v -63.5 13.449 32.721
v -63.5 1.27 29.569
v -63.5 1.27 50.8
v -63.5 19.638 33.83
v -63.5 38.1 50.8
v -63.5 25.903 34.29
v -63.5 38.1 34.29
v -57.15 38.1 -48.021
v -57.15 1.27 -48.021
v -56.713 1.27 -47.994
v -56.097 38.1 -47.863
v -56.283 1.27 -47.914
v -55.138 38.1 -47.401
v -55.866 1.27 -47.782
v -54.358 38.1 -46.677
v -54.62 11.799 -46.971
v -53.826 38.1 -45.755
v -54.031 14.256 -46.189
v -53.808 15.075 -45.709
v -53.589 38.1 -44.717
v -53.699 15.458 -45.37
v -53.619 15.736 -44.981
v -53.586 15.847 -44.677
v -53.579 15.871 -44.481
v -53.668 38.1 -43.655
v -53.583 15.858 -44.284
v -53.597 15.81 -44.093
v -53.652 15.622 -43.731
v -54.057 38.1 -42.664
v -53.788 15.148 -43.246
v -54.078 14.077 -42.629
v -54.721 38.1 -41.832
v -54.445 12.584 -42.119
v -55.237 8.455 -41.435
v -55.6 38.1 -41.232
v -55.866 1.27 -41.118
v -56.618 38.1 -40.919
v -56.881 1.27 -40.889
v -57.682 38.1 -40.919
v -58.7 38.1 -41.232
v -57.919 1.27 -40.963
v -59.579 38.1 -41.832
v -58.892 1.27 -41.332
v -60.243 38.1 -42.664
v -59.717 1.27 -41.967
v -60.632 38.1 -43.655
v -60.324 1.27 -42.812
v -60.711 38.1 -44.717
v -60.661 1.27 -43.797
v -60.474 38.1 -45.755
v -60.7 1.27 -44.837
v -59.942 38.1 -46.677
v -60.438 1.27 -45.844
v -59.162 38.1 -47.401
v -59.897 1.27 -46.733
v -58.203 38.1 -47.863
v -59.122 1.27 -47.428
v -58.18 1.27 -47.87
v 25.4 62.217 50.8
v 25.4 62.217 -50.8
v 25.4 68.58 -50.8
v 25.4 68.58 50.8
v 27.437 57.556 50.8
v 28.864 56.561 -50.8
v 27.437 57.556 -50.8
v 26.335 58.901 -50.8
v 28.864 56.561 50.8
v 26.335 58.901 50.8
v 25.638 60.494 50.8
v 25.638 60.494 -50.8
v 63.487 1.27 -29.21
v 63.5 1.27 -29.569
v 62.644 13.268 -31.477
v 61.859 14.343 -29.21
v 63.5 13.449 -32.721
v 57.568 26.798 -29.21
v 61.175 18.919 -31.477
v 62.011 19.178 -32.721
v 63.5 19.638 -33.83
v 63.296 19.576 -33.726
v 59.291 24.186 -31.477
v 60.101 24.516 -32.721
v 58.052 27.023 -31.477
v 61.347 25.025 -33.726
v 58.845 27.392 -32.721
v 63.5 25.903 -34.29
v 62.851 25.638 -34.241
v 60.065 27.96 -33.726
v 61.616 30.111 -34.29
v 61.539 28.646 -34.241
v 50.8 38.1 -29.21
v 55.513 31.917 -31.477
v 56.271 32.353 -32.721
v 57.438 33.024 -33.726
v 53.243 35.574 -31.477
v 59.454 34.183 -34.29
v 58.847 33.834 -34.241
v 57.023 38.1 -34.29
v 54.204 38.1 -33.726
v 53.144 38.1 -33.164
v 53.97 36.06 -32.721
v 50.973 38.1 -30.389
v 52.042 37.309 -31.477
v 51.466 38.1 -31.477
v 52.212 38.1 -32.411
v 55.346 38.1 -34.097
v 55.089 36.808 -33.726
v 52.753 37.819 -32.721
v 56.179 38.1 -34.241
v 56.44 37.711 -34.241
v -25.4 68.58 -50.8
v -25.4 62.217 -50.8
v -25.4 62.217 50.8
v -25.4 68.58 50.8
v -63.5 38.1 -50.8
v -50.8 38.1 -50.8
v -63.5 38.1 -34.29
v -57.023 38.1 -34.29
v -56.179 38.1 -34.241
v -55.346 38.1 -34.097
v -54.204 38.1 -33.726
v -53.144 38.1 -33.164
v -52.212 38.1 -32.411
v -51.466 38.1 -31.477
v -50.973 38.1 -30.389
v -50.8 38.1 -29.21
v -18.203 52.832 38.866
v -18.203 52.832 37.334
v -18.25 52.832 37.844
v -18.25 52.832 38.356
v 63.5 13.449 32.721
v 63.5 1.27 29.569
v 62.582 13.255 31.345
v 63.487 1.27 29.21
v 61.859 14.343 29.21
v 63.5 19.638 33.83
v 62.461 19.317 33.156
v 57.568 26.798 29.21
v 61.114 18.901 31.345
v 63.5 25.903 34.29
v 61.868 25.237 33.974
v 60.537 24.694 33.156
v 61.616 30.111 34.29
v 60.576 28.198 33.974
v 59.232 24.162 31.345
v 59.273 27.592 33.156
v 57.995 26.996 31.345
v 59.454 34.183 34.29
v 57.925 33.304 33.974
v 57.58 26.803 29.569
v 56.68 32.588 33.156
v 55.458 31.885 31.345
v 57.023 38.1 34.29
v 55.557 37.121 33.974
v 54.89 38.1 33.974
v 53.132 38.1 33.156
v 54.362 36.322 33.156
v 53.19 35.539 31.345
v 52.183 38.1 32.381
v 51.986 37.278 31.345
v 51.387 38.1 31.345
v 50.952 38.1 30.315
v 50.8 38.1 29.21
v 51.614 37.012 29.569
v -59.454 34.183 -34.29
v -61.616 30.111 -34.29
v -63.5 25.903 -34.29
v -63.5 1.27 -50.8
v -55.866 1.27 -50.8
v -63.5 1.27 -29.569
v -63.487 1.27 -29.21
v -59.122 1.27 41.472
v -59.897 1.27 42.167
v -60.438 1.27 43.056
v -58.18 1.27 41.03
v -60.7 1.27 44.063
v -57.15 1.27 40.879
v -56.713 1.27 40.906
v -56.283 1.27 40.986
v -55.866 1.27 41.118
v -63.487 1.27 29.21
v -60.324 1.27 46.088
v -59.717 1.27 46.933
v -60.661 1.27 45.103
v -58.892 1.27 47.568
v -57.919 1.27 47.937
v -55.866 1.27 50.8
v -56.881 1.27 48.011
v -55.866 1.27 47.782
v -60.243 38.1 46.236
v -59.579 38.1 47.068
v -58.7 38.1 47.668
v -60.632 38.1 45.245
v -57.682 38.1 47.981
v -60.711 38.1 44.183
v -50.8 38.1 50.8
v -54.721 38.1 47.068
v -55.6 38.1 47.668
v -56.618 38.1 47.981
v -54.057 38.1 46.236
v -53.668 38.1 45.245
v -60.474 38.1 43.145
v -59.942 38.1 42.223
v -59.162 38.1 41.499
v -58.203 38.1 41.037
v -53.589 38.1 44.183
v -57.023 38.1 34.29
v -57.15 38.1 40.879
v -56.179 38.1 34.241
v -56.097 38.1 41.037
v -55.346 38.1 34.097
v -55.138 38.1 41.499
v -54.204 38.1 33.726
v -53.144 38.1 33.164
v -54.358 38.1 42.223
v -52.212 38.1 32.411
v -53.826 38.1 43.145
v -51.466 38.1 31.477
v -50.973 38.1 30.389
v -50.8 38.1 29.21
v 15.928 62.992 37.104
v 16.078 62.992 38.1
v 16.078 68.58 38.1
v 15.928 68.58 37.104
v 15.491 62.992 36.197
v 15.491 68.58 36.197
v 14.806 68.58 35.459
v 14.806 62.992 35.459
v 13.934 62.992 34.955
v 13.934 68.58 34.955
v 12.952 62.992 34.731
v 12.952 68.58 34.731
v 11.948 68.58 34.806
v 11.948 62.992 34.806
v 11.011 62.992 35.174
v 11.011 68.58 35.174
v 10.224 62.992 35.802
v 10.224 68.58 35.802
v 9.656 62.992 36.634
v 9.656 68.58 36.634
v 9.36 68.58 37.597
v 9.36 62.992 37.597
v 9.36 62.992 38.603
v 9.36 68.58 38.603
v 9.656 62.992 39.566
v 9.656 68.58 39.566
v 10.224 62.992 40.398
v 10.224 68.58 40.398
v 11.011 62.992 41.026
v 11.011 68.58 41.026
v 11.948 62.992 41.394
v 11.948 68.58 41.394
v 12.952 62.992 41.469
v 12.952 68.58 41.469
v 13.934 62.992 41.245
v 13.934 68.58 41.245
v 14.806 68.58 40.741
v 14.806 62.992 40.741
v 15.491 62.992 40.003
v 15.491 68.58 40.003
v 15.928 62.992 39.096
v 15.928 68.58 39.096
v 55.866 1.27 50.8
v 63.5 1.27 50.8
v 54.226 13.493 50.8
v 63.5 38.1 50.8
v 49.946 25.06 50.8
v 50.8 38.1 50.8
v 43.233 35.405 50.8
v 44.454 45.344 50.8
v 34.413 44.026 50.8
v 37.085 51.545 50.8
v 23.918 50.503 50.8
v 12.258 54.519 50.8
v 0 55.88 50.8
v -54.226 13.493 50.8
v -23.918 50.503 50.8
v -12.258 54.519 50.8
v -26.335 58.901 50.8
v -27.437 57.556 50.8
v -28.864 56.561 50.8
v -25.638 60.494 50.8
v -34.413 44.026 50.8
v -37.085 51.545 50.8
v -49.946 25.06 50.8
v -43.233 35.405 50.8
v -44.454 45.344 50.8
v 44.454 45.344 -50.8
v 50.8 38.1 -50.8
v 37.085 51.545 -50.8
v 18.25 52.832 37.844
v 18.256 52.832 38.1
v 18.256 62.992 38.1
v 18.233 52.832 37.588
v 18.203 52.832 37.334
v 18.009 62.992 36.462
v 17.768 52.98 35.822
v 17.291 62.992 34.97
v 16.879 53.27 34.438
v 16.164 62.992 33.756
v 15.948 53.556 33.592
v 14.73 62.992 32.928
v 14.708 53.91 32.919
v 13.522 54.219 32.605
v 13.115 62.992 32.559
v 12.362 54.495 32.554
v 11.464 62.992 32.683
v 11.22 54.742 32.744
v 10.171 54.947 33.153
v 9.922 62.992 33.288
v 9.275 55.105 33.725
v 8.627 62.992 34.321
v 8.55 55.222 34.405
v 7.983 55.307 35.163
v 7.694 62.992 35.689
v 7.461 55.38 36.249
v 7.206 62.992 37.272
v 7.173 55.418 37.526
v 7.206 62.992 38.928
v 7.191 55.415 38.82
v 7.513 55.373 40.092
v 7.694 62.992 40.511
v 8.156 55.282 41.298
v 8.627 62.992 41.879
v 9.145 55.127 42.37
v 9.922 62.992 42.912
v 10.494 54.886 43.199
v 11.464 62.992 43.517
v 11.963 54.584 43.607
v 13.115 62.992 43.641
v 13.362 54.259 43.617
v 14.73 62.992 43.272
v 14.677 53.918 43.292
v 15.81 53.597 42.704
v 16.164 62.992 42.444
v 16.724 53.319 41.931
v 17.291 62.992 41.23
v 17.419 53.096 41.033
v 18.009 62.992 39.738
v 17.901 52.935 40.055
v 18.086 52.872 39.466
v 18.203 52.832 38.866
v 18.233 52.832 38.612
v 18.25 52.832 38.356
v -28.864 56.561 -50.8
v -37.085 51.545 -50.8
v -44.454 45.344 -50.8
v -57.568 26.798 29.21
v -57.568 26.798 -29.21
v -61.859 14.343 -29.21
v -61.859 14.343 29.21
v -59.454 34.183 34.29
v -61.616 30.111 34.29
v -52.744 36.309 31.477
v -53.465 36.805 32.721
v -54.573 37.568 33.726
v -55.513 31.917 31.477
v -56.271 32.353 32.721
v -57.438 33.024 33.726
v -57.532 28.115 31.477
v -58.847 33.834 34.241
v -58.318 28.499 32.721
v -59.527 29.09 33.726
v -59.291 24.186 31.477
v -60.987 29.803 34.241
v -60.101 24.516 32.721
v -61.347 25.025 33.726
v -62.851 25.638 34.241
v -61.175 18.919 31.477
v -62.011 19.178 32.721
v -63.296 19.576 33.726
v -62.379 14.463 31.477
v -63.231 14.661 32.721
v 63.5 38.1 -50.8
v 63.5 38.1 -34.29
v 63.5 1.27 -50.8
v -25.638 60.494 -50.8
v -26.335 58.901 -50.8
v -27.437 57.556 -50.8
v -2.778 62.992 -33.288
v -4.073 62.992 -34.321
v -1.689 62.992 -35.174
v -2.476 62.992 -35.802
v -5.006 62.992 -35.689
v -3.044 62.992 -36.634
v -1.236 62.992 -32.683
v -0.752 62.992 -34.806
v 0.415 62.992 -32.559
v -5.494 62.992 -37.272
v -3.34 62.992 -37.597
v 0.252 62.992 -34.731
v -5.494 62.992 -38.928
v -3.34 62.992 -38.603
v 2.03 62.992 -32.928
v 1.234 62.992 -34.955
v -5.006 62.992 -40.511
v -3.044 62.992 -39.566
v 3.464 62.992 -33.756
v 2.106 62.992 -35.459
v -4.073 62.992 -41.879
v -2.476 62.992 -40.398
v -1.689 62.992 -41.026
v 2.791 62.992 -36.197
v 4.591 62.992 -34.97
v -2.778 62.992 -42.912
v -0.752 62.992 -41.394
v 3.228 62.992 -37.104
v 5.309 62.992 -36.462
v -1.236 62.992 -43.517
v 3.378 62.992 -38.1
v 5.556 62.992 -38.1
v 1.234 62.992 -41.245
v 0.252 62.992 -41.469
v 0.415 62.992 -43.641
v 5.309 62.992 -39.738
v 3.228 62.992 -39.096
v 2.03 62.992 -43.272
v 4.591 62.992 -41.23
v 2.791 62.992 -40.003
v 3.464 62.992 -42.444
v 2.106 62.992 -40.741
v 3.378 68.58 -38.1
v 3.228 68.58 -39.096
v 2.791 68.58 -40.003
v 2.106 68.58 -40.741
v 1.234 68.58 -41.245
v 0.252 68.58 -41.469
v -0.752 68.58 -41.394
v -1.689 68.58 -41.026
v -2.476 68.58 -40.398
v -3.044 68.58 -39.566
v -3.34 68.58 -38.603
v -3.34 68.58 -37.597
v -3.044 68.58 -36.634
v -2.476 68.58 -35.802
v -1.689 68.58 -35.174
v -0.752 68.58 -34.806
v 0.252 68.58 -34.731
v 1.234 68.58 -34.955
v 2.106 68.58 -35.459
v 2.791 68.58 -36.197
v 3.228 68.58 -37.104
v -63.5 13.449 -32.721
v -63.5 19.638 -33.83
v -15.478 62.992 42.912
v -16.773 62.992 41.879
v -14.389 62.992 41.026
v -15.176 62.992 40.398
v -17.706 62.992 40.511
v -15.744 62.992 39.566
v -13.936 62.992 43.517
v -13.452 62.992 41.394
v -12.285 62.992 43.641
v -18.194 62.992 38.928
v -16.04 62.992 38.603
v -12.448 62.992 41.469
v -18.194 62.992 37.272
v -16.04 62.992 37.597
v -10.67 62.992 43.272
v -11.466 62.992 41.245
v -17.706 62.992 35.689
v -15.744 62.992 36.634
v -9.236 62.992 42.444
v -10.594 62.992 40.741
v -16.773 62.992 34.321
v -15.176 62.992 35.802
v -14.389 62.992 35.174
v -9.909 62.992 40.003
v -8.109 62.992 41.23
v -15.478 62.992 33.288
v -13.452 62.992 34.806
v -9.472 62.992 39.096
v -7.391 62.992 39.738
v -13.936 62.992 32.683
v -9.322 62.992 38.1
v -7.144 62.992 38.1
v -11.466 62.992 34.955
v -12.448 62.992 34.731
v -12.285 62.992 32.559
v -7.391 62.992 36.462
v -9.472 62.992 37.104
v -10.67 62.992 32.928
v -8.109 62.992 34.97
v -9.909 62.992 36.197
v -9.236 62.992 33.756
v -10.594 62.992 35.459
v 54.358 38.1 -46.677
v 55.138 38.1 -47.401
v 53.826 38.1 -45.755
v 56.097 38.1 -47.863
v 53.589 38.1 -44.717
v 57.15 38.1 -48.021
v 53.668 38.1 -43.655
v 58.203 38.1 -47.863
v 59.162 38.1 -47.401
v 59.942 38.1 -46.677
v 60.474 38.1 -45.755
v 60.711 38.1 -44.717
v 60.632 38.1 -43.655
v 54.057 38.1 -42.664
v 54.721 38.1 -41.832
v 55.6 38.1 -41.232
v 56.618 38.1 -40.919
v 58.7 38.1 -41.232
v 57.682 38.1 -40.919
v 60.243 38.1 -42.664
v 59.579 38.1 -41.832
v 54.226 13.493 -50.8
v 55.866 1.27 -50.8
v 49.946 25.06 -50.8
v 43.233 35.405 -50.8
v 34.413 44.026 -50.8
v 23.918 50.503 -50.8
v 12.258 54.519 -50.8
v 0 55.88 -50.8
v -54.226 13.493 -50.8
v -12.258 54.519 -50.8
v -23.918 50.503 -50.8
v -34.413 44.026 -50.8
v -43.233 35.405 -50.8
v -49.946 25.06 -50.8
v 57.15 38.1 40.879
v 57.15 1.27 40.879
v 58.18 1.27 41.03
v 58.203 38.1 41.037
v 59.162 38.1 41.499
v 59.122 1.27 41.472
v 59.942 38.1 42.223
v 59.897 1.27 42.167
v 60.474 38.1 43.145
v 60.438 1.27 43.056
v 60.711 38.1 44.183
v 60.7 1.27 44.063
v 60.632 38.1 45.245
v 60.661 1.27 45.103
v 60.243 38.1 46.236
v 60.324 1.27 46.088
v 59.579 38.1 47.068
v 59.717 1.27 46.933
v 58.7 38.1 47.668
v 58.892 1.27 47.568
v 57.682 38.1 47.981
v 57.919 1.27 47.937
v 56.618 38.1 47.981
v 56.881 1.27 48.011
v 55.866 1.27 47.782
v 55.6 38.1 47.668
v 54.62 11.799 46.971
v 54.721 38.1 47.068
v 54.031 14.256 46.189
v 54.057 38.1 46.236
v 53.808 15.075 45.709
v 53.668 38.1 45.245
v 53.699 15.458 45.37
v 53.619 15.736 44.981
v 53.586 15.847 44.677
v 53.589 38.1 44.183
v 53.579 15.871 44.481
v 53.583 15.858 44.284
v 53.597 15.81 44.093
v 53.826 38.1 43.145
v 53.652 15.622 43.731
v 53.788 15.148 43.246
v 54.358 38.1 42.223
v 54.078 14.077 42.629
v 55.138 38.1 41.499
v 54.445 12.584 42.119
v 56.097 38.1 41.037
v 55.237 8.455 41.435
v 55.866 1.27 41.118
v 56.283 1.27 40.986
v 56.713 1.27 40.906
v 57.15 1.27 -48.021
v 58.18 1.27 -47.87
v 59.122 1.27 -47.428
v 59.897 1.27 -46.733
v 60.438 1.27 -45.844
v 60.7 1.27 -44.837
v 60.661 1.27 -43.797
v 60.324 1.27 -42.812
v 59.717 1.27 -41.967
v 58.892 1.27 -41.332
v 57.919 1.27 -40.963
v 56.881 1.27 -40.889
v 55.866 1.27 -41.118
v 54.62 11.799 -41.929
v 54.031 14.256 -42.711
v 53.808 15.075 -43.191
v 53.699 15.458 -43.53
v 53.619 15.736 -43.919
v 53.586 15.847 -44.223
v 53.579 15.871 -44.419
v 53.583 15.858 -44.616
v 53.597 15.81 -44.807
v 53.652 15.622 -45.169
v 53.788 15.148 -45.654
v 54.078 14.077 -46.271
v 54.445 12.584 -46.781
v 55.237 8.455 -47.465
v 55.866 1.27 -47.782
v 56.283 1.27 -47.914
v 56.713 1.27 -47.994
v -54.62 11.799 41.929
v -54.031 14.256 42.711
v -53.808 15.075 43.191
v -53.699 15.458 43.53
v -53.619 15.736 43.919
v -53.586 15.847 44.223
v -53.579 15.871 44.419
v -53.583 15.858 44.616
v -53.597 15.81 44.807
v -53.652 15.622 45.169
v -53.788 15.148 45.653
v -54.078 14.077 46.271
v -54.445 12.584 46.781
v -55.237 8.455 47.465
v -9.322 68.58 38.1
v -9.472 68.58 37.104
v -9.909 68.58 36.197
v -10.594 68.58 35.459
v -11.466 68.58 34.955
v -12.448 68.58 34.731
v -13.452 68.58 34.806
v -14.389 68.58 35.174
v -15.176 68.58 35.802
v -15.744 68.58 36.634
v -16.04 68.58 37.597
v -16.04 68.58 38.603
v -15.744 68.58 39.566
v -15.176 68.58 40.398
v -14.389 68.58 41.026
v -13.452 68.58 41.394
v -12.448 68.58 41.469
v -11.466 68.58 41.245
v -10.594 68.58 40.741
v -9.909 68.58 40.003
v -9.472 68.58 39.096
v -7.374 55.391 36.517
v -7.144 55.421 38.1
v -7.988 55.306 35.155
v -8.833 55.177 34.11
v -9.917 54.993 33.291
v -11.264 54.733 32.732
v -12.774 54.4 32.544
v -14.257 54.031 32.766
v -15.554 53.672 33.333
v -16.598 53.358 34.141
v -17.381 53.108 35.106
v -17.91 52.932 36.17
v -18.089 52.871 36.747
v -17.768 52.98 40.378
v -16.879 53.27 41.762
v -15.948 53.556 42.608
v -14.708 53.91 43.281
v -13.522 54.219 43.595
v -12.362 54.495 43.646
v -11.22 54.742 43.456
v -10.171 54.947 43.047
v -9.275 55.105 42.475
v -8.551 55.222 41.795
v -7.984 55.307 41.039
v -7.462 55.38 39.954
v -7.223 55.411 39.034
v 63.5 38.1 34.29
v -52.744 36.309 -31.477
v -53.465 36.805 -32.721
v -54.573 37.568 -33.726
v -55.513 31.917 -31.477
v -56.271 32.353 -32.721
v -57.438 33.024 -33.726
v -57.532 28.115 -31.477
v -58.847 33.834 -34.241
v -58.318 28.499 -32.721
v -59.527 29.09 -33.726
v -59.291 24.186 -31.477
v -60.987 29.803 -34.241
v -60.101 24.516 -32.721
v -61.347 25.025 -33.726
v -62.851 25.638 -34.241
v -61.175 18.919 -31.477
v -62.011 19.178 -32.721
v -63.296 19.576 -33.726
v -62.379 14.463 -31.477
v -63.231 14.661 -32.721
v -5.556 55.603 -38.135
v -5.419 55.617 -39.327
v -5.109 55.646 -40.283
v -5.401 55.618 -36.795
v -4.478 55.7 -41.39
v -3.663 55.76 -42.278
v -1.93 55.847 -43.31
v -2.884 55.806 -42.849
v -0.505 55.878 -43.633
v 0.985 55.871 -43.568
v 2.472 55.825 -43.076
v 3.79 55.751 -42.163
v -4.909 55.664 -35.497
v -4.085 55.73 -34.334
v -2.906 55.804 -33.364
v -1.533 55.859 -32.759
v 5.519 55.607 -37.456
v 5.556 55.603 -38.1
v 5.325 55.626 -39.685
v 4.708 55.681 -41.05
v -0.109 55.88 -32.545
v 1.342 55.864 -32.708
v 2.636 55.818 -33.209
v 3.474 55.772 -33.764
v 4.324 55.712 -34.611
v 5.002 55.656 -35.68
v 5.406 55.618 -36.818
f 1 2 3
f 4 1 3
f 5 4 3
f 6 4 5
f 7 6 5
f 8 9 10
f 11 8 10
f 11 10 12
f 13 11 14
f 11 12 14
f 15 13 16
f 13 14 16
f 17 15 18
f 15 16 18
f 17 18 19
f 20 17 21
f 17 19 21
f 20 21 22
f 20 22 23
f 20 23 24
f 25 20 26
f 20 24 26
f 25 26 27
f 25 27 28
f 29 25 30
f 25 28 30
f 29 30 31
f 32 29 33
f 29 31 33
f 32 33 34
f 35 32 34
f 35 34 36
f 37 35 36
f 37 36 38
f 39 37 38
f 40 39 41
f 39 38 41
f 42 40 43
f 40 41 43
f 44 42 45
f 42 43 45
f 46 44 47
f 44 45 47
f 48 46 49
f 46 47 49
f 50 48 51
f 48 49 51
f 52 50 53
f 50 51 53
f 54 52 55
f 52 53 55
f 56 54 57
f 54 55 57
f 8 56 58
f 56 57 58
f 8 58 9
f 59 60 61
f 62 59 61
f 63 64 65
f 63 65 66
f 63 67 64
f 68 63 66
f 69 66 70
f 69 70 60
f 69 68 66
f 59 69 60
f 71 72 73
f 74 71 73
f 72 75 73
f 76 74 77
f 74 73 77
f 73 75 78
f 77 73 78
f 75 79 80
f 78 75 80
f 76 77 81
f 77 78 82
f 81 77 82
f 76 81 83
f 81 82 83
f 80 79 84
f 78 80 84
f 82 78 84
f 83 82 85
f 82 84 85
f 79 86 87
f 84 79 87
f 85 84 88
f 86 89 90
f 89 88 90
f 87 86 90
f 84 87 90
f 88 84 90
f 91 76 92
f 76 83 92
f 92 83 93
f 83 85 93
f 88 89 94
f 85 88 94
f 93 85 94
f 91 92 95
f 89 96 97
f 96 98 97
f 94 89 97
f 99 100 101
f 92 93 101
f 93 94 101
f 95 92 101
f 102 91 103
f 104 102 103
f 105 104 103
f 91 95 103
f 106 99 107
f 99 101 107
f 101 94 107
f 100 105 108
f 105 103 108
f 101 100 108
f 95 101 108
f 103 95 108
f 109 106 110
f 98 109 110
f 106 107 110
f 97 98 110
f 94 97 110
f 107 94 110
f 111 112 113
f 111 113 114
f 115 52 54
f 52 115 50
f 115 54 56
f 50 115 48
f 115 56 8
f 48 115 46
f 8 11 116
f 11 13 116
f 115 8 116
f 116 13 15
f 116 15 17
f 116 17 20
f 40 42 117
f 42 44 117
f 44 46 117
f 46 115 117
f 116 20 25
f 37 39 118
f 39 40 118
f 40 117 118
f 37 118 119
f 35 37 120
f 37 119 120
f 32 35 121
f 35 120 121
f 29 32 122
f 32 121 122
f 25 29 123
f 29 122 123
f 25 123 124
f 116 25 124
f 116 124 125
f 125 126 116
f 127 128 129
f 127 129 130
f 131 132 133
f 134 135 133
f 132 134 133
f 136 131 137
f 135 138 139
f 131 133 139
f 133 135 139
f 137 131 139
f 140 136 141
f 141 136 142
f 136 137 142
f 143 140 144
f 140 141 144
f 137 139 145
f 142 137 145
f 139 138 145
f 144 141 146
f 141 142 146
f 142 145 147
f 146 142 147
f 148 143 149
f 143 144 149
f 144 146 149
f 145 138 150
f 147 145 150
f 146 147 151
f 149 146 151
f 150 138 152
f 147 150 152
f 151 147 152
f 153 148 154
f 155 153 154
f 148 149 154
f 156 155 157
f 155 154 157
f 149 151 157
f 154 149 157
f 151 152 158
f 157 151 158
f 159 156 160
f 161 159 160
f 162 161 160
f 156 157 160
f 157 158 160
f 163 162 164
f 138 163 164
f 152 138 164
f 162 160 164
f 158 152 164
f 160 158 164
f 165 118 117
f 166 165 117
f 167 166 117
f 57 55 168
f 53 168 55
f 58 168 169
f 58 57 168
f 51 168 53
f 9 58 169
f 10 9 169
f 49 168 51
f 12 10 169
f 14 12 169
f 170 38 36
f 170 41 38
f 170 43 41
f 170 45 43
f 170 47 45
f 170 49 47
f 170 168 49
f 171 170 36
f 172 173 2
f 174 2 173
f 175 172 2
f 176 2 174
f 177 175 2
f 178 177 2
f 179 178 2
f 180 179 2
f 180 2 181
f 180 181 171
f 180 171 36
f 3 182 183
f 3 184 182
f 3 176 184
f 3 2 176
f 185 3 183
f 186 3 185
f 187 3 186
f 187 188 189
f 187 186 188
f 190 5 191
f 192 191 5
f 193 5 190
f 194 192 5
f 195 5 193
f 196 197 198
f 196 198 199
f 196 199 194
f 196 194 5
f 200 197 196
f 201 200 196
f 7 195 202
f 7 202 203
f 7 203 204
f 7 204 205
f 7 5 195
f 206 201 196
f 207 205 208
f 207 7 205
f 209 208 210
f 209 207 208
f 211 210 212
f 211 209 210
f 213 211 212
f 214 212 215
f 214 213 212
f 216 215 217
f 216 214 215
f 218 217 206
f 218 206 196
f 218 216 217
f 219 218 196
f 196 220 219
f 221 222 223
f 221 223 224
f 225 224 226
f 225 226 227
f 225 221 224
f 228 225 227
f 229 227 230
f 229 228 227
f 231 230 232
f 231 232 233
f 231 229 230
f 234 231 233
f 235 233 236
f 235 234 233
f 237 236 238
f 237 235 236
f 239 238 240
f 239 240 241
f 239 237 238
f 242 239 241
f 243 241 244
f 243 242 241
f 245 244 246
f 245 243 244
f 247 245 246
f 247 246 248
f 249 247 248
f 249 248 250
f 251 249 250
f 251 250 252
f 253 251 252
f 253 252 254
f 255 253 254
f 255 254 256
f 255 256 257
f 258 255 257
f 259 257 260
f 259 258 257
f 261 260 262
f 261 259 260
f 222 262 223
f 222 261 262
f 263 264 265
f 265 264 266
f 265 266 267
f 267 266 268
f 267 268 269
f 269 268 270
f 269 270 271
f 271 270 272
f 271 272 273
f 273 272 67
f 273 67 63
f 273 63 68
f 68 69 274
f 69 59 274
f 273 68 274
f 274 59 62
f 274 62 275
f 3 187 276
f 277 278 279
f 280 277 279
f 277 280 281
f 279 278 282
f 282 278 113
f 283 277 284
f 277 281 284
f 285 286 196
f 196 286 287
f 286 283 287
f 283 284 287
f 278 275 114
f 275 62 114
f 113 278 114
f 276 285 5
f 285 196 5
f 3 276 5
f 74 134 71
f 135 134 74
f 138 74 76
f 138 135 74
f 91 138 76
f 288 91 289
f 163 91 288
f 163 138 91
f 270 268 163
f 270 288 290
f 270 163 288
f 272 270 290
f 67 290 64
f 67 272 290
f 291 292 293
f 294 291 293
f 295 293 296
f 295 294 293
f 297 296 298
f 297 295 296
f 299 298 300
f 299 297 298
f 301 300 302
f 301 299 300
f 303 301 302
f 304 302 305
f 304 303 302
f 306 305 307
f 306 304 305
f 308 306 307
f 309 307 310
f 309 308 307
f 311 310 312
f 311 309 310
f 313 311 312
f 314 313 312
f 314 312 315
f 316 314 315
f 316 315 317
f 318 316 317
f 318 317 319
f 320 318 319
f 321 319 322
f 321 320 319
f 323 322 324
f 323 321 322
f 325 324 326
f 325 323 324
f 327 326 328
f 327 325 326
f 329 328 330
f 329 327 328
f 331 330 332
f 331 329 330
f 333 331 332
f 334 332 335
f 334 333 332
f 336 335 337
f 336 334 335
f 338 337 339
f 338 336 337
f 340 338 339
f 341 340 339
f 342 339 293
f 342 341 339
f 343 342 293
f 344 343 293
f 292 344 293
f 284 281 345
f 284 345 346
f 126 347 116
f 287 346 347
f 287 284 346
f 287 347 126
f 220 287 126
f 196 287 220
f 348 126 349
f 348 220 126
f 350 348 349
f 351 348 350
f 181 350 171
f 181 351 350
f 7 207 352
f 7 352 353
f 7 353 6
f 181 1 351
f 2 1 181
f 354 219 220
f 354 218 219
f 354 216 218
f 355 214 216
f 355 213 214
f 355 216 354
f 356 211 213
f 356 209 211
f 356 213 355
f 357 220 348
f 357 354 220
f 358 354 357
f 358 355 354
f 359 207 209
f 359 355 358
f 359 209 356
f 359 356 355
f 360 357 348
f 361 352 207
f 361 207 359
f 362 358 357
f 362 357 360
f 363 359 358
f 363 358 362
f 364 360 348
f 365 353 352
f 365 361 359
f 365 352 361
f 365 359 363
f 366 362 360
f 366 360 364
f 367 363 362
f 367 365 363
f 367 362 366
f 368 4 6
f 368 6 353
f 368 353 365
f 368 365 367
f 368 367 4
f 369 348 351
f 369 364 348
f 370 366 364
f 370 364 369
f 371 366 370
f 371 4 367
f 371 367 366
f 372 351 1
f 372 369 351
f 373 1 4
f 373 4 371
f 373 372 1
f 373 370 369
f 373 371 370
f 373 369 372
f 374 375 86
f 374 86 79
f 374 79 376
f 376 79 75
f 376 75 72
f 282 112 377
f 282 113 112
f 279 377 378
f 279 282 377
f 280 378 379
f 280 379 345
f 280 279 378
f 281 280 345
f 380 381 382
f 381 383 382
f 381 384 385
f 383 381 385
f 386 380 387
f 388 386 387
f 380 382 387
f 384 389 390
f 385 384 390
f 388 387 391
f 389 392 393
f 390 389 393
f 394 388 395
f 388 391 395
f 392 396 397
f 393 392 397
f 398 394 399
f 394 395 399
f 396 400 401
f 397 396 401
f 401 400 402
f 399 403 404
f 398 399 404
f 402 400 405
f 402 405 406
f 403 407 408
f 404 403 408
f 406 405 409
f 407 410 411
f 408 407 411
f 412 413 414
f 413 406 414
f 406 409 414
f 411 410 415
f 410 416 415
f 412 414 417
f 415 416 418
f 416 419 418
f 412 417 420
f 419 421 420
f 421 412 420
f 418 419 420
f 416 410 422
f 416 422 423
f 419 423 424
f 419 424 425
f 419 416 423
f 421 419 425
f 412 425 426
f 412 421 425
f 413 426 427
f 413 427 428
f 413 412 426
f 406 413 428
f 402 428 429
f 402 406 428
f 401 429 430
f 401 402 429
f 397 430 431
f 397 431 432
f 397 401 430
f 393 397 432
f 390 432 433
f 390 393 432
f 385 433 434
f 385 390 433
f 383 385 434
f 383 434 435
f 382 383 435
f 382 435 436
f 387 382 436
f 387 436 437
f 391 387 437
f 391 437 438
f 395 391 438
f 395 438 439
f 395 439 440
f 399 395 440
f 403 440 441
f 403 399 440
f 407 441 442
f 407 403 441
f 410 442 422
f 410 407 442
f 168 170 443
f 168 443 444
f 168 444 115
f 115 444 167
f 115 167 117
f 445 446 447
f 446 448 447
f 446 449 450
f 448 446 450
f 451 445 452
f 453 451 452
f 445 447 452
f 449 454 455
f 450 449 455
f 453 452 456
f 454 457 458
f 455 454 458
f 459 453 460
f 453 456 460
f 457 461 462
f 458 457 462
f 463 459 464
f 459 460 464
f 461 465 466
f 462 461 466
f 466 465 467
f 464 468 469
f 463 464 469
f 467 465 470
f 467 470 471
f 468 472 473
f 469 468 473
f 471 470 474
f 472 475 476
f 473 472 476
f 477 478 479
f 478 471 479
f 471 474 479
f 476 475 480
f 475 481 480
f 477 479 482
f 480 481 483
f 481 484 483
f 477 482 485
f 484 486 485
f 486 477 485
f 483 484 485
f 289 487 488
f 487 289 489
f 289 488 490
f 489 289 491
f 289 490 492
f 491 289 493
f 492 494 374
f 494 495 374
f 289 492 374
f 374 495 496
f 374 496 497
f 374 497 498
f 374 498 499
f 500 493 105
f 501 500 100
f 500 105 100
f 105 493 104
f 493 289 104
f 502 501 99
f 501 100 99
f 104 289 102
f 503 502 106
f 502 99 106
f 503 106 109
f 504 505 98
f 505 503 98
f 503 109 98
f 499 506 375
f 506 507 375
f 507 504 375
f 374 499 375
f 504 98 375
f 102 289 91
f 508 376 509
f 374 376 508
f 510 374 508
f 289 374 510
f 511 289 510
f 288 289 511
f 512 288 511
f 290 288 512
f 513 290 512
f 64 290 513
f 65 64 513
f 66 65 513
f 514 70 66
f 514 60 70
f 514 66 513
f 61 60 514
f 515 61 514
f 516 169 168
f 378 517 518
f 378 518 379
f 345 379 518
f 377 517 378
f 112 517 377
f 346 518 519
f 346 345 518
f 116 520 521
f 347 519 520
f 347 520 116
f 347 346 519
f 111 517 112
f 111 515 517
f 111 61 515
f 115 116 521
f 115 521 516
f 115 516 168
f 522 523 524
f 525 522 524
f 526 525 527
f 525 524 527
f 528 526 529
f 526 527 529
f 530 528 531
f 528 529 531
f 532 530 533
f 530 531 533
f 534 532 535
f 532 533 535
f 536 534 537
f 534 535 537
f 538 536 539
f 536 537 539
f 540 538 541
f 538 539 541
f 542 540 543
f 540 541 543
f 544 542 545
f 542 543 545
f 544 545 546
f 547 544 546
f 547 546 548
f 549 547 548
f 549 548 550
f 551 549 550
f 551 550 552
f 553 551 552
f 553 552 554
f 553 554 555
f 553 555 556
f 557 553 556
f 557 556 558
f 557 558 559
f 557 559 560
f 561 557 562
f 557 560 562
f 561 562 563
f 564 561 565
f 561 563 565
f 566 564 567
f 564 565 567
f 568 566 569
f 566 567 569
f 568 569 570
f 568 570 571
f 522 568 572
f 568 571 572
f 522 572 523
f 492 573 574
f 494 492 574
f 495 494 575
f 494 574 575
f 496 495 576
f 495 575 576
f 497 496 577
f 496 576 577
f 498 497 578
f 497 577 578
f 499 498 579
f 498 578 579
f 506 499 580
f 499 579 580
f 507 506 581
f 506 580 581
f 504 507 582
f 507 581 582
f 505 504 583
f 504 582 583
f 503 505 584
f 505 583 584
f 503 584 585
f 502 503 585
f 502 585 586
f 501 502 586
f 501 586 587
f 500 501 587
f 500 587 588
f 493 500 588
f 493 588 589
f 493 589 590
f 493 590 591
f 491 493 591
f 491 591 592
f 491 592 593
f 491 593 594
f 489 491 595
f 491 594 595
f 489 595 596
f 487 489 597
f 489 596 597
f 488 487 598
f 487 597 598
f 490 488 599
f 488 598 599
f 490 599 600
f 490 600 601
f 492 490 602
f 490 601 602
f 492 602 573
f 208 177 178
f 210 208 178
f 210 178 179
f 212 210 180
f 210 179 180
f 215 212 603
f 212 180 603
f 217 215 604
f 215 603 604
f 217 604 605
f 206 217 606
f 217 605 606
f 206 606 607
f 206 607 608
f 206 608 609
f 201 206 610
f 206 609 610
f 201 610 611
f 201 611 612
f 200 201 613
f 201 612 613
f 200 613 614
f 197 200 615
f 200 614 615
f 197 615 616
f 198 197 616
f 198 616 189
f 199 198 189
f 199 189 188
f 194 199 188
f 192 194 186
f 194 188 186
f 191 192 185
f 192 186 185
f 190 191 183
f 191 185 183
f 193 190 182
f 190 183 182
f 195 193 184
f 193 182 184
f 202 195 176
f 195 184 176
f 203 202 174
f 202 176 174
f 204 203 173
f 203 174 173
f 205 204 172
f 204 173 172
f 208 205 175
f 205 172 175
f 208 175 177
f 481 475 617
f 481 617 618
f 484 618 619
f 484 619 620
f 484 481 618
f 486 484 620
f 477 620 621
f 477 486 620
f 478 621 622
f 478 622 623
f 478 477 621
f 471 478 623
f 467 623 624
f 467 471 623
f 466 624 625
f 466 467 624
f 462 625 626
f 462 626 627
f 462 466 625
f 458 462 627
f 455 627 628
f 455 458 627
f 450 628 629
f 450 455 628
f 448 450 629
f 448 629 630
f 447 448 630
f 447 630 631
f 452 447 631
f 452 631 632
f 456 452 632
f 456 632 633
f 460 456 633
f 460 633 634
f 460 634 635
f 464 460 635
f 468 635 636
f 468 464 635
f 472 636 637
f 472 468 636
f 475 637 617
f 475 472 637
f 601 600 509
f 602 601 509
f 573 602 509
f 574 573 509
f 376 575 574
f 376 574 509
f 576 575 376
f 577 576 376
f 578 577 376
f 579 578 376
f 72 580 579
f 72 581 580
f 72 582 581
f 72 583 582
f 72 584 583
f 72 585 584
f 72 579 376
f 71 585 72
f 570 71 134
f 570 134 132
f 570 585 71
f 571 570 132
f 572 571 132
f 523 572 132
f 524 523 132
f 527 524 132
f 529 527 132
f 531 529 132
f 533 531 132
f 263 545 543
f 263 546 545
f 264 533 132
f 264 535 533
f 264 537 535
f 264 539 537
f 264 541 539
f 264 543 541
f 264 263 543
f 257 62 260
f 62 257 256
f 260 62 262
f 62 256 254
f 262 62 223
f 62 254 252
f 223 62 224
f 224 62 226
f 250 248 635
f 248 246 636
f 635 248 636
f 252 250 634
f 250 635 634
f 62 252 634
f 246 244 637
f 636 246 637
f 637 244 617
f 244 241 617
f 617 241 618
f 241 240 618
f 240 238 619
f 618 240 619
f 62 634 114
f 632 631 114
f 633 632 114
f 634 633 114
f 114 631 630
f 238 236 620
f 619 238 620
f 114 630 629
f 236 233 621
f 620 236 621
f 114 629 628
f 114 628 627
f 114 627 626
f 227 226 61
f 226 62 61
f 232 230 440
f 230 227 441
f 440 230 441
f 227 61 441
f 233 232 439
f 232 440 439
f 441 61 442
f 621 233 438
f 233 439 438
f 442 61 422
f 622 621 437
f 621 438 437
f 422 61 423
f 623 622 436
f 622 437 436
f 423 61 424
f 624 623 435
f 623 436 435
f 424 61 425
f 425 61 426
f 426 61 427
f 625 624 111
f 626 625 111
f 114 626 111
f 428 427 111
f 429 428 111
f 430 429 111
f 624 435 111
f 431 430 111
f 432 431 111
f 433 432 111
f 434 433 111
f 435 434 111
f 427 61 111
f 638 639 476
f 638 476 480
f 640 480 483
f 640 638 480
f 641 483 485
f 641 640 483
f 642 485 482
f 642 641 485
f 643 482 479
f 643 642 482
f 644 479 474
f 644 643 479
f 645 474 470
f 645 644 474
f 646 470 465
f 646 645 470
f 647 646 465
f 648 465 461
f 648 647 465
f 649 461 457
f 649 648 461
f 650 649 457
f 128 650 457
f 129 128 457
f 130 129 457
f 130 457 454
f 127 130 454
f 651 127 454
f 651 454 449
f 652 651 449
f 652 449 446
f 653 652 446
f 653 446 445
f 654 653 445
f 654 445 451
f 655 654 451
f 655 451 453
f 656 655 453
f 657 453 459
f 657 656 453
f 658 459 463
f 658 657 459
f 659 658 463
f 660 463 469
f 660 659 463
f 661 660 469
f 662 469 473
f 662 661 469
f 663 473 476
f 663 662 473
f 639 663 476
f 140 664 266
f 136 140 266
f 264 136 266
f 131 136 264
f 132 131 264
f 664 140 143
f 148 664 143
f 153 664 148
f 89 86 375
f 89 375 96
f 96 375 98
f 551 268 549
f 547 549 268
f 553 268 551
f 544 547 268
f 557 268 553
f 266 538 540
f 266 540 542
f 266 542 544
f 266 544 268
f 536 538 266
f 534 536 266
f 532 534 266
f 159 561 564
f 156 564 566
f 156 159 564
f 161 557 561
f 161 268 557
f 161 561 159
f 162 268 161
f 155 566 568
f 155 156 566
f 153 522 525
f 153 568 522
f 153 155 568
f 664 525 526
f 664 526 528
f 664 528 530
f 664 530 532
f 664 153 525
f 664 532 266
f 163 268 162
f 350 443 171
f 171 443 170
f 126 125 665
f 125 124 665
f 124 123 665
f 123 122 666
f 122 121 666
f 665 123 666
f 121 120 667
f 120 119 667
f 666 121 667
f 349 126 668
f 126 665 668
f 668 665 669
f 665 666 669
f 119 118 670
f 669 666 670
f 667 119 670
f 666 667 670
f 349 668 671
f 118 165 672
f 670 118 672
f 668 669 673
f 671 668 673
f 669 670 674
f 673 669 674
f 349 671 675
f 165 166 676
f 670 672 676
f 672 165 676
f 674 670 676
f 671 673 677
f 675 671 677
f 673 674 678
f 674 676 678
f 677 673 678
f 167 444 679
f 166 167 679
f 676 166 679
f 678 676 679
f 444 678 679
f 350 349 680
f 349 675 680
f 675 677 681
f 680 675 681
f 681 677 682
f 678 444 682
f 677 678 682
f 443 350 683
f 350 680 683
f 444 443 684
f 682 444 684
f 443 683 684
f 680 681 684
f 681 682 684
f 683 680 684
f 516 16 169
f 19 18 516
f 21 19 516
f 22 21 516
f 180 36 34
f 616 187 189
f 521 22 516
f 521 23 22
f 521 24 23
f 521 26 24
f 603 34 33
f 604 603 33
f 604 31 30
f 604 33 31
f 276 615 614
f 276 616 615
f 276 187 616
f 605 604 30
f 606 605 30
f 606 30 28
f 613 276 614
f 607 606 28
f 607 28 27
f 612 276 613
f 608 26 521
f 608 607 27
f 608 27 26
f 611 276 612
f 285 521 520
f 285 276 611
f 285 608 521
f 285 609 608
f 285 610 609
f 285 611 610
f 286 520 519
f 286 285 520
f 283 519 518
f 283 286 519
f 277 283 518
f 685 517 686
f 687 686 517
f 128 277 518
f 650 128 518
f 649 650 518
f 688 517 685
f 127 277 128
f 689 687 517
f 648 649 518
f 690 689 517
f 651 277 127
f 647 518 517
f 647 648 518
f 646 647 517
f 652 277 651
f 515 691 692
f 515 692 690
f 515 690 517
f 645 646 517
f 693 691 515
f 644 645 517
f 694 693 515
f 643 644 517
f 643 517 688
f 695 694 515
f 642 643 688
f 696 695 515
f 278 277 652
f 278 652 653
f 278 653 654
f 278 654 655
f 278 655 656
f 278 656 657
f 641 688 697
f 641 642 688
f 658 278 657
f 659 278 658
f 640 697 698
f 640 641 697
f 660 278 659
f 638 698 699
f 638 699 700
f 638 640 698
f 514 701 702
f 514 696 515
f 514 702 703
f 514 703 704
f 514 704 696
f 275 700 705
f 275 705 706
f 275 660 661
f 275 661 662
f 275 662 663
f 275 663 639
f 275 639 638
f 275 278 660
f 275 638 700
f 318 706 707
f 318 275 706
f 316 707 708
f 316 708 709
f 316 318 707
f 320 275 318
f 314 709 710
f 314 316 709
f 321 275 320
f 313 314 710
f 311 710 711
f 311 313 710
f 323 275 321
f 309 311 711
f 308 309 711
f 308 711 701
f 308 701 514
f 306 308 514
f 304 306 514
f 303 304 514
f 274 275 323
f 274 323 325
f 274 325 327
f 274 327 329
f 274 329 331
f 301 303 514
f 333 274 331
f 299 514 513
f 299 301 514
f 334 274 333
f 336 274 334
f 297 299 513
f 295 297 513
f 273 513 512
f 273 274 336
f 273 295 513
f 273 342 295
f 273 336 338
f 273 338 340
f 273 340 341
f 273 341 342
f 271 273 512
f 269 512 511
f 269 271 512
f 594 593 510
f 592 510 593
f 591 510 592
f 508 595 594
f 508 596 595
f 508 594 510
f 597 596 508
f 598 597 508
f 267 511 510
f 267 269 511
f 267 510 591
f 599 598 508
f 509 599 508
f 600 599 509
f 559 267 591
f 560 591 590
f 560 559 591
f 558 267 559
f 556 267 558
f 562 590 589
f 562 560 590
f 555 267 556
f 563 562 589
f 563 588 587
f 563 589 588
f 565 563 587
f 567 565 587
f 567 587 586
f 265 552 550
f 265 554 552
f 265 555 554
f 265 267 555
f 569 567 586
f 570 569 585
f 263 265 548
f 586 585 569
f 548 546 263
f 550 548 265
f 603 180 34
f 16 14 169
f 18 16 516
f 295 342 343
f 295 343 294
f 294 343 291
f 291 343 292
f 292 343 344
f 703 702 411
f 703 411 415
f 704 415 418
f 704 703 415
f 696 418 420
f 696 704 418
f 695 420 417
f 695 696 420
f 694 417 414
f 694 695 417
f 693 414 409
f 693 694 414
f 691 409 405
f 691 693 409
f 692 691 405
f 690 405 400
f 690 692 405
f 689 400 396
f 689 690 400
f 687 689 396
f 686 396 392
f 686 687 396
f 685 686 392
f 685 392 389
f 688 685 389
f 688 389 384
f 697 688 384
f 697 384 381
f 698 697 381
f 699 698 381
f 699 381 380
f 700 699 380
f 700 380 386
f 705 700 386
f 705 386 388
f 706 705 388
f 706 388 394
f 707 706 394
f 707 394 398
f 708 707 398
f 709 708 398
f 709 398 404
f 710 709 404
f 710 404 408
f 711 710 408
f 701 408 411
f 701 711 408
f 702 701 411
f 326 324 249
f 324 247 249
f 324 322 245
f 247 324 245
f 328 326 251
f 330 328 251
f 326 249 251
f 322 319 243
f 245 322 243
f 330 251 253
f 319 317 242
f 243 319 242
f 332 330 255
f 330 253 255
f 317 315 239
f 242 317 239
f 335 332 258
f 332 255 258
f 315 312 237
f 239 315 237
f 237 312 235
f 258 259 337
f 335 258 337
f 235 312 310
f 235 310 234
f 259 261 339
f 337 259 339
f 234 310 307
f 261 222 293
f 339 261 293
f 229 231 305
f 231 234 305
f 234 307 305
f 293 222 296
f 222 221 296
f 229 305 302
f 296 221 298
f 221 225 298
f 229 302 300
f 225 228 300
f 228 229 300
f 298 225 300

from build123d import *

# Parameters (mm, degrees)
BOSS_EXTRUDE1_DEPTH                          = 50.8
BOSS_EXTRUDE2_START                          = -16.51
BOSS_EXTRUDE2_DEPTH                          = 16.51
SKETCH4_W                                    = 127
SKETCH4_H                                    = 1.27
CUT_EXTRUDE1_DEPTH                           = 136.598893801
F_1_4_CLEARANCE_HOLE1_D                      = 7.14248
FILLET1_R                                    = 5.08
SKETCH7_W                                    = 50.8
SKETCH7_H                                    = 12.7
BOSS_EXTRUDE3_DEPTH                          = 101.6
FILLET2_R                                    = 6.35
CBORE_START                                  = 52.832
CBORE_FOR_1_4_SOCKET_HEAD_CAP_SCREW1_OUT_R   = 5.55625
CBORE_FOR_1_4_SOCKET_HEAD_CAP_SCREW1_DEPTH   = 10.16
CBORE_START_2                                = 62.992
CBORE_FOR_1_4_SOCKET_HEAD_CAP_SCREW1_2_O_R   = 3.3782
CBORE_FOR_1_4_SOCKET_HEAD_CAP_SCREW1_2_DEPTH = 5.588


# Read off the part's stored shape, not the designer's step: CBORE for 1/4 Socket Head Cap Screw1
with BuildPart() as part:
    # Sketch1 → Boss-Extrude1 (new, symmetric)
    with BuildSketch(Plane.XY):
        with BuildLine():
            Line((55.88, 0), (63.5, 0))
            ThreePointArc((63.5, 0), (0, 63.5), (-63.5, 0))
            Line((-63.5, 0), (-55.88, 0))
            ThreePointArc((-55.88, 0), (0, 55.88), (55.88, 0))
        make_face()
    extrude(amount=BOSS_EXTRUDE1_DEPTH, both=True)

    # Sketch2 → Boss-Extrude2 (add)
    with BuildSketch(Plane(origin=(0, 0, -50.8), x_dir=(-1, 0, 0), z_dir=(0, 0, -1)).offset(BOSS_EXTRUDE2_START)):
        with BuildLine():
            Line((-63.5, 38.1), (-63.5, 0))
            ThreePointArc((-63.5, 0), (-60.241389426, 20.080463142), (-50.8, 38.1))
            Line((-50.8, 38.1), (-63.5, 38.1))
        make_face()
        with BuildLine():
            Line((63.5, 38.1), (50.8, 38.1))
            ThreePointArc((50.8, 38.1), (60.241389426, 20.080463142), (63.5, 0))
            Line((63.5, 0), (63.5, 38.1))
        make_face()
    boss_extrude2 = extrude(amount=BOSS_EXTRUDE2_DEPTH)

    # Mirror1: Boss-Extrude2 across plane
    add(boss_extrude2.mirror(Plane.XY))

    # Sketch4 → Cut-Extrude1 (cut, through all)
    with BuildSketch(Plane.XY.offset(50.8)):
        with Locations((0, 0.635)):
            Rectangle(SKETCH4_W, SKETCH4_H)
    extrude(amount=-CUT_EXTRUDE1_DEPTH, mode=Mode.SUBTRACT)

    # 1/4 Clearance Hole1 (through all)
    with Locations(Plane(origin=(-57.15, 38.1, -44.45), x_dir=(0, 0, 1), z_dir=(0, 1, 0))):
        with Locations((0, 0), (0, 114.3), (88.9, 0), (88.9, 114.3)):
            Hole(F_1_4_CLEARANCE_HOLE1_D / 2)

    # Fillet1
    fillet1_edges = [part.edges().sort_by_distance(p)[0] for p in [
        (60.037562307, 20.681903014, 34.29),
        (-60.037562307, 20.681903014, 34.29),
        (-60.037562307, 20.681903014, -34.29),
        (60.037562307, 20.681903014, -34.29),
    ]]
    fillet(fillet1_edges, radius=FILLET1_R)

    # Sketch7 → Boss-Extrude3 (add)
    with BuildSketch(Plane(origin=(0, 0, -50.8), x_dir=(-1, 0, 0), z_dir=(0, 0, -1))):
        with Locations((0, 62.23)):
            Rectangle(SKETCH7_W, SKETCH7_H)
    extrude(amount=-BOSS_EXTRUDE3_DEPTH)

    # Fillet2
    fillet2_edges = [part.edges().sort_by_distance(p)[0] for p in [
        (-25.4, 58.198711326, 0),
        (25.4, 58.198711326, 0),
    ]]
    fillet(fillet2_edges, radius=FILLET2_R)

    # CBORE for 1/4 Socket Head Cap Screw1 out → CBORE for 1/4 Socket Head Cap Screw1 (cut)
    with BuildSketch(Plane(origin=(0, 0, 0), x_dir=(1, 0, 0), z_dir=(0, 1, 0)).offset(CBORE_START)):
        with Locations((-12.7, -38.1)):
            Circle(CBORE_FOR_1_4_SOCKET_HEAD_CAP_SCREW1_OUT_R)
        with Locations((12.7, -38.1)):
            Circle(CBORE_FOR_1_4_SOCKET_HEAD_CAP_SCREW1_OUT_R)
        with Locations((0, 38.1)):
            Circle(CBORE_FOR_1_4_SOCKET_HEAD_CAP_SCREW1_OUT_R)
    extrude(amount=CBORE_FOR_1_4_SOCKET_HEAD_CAP_SCREW1_DEPTH, mode=Mode.SUBTRACT)

    # CBORE for 1_4 Socket Head Cap Screw1 2 o → CBORE for 1_4 Socket Head Cap Screw1 2 (cut)
    with BuildSketch(Plane(origin=(0, 0, 0), x_dir=(1, 0, 0), z_dir=(0, 1, 0)).offset(CBORE_START_2)):
        with Locations((-12.7, -38.1)):
            Circle(CBORE_FOR_1_4_SOCKET_HEAD_CAP_SCREW1_2_O_R)
        with Locations((12.7, -38.1)):
            Circle(CBORE_FOR_1_4_SOCKET_HEAD_CAP_SCREW1_2_O_R)
        with Locations((0, 38.1)):
            Circle(CBORE_FOR_1_4_SOCKET_HEAD_CAP_SCREW1_2_O_R)
    extrude(amount=CBORE_FOR_1_4_SOCKET_HEAD_CAP_SCREW1_2_DEPTH, mode=Mode.SUBTRACT)


solid = part.part
